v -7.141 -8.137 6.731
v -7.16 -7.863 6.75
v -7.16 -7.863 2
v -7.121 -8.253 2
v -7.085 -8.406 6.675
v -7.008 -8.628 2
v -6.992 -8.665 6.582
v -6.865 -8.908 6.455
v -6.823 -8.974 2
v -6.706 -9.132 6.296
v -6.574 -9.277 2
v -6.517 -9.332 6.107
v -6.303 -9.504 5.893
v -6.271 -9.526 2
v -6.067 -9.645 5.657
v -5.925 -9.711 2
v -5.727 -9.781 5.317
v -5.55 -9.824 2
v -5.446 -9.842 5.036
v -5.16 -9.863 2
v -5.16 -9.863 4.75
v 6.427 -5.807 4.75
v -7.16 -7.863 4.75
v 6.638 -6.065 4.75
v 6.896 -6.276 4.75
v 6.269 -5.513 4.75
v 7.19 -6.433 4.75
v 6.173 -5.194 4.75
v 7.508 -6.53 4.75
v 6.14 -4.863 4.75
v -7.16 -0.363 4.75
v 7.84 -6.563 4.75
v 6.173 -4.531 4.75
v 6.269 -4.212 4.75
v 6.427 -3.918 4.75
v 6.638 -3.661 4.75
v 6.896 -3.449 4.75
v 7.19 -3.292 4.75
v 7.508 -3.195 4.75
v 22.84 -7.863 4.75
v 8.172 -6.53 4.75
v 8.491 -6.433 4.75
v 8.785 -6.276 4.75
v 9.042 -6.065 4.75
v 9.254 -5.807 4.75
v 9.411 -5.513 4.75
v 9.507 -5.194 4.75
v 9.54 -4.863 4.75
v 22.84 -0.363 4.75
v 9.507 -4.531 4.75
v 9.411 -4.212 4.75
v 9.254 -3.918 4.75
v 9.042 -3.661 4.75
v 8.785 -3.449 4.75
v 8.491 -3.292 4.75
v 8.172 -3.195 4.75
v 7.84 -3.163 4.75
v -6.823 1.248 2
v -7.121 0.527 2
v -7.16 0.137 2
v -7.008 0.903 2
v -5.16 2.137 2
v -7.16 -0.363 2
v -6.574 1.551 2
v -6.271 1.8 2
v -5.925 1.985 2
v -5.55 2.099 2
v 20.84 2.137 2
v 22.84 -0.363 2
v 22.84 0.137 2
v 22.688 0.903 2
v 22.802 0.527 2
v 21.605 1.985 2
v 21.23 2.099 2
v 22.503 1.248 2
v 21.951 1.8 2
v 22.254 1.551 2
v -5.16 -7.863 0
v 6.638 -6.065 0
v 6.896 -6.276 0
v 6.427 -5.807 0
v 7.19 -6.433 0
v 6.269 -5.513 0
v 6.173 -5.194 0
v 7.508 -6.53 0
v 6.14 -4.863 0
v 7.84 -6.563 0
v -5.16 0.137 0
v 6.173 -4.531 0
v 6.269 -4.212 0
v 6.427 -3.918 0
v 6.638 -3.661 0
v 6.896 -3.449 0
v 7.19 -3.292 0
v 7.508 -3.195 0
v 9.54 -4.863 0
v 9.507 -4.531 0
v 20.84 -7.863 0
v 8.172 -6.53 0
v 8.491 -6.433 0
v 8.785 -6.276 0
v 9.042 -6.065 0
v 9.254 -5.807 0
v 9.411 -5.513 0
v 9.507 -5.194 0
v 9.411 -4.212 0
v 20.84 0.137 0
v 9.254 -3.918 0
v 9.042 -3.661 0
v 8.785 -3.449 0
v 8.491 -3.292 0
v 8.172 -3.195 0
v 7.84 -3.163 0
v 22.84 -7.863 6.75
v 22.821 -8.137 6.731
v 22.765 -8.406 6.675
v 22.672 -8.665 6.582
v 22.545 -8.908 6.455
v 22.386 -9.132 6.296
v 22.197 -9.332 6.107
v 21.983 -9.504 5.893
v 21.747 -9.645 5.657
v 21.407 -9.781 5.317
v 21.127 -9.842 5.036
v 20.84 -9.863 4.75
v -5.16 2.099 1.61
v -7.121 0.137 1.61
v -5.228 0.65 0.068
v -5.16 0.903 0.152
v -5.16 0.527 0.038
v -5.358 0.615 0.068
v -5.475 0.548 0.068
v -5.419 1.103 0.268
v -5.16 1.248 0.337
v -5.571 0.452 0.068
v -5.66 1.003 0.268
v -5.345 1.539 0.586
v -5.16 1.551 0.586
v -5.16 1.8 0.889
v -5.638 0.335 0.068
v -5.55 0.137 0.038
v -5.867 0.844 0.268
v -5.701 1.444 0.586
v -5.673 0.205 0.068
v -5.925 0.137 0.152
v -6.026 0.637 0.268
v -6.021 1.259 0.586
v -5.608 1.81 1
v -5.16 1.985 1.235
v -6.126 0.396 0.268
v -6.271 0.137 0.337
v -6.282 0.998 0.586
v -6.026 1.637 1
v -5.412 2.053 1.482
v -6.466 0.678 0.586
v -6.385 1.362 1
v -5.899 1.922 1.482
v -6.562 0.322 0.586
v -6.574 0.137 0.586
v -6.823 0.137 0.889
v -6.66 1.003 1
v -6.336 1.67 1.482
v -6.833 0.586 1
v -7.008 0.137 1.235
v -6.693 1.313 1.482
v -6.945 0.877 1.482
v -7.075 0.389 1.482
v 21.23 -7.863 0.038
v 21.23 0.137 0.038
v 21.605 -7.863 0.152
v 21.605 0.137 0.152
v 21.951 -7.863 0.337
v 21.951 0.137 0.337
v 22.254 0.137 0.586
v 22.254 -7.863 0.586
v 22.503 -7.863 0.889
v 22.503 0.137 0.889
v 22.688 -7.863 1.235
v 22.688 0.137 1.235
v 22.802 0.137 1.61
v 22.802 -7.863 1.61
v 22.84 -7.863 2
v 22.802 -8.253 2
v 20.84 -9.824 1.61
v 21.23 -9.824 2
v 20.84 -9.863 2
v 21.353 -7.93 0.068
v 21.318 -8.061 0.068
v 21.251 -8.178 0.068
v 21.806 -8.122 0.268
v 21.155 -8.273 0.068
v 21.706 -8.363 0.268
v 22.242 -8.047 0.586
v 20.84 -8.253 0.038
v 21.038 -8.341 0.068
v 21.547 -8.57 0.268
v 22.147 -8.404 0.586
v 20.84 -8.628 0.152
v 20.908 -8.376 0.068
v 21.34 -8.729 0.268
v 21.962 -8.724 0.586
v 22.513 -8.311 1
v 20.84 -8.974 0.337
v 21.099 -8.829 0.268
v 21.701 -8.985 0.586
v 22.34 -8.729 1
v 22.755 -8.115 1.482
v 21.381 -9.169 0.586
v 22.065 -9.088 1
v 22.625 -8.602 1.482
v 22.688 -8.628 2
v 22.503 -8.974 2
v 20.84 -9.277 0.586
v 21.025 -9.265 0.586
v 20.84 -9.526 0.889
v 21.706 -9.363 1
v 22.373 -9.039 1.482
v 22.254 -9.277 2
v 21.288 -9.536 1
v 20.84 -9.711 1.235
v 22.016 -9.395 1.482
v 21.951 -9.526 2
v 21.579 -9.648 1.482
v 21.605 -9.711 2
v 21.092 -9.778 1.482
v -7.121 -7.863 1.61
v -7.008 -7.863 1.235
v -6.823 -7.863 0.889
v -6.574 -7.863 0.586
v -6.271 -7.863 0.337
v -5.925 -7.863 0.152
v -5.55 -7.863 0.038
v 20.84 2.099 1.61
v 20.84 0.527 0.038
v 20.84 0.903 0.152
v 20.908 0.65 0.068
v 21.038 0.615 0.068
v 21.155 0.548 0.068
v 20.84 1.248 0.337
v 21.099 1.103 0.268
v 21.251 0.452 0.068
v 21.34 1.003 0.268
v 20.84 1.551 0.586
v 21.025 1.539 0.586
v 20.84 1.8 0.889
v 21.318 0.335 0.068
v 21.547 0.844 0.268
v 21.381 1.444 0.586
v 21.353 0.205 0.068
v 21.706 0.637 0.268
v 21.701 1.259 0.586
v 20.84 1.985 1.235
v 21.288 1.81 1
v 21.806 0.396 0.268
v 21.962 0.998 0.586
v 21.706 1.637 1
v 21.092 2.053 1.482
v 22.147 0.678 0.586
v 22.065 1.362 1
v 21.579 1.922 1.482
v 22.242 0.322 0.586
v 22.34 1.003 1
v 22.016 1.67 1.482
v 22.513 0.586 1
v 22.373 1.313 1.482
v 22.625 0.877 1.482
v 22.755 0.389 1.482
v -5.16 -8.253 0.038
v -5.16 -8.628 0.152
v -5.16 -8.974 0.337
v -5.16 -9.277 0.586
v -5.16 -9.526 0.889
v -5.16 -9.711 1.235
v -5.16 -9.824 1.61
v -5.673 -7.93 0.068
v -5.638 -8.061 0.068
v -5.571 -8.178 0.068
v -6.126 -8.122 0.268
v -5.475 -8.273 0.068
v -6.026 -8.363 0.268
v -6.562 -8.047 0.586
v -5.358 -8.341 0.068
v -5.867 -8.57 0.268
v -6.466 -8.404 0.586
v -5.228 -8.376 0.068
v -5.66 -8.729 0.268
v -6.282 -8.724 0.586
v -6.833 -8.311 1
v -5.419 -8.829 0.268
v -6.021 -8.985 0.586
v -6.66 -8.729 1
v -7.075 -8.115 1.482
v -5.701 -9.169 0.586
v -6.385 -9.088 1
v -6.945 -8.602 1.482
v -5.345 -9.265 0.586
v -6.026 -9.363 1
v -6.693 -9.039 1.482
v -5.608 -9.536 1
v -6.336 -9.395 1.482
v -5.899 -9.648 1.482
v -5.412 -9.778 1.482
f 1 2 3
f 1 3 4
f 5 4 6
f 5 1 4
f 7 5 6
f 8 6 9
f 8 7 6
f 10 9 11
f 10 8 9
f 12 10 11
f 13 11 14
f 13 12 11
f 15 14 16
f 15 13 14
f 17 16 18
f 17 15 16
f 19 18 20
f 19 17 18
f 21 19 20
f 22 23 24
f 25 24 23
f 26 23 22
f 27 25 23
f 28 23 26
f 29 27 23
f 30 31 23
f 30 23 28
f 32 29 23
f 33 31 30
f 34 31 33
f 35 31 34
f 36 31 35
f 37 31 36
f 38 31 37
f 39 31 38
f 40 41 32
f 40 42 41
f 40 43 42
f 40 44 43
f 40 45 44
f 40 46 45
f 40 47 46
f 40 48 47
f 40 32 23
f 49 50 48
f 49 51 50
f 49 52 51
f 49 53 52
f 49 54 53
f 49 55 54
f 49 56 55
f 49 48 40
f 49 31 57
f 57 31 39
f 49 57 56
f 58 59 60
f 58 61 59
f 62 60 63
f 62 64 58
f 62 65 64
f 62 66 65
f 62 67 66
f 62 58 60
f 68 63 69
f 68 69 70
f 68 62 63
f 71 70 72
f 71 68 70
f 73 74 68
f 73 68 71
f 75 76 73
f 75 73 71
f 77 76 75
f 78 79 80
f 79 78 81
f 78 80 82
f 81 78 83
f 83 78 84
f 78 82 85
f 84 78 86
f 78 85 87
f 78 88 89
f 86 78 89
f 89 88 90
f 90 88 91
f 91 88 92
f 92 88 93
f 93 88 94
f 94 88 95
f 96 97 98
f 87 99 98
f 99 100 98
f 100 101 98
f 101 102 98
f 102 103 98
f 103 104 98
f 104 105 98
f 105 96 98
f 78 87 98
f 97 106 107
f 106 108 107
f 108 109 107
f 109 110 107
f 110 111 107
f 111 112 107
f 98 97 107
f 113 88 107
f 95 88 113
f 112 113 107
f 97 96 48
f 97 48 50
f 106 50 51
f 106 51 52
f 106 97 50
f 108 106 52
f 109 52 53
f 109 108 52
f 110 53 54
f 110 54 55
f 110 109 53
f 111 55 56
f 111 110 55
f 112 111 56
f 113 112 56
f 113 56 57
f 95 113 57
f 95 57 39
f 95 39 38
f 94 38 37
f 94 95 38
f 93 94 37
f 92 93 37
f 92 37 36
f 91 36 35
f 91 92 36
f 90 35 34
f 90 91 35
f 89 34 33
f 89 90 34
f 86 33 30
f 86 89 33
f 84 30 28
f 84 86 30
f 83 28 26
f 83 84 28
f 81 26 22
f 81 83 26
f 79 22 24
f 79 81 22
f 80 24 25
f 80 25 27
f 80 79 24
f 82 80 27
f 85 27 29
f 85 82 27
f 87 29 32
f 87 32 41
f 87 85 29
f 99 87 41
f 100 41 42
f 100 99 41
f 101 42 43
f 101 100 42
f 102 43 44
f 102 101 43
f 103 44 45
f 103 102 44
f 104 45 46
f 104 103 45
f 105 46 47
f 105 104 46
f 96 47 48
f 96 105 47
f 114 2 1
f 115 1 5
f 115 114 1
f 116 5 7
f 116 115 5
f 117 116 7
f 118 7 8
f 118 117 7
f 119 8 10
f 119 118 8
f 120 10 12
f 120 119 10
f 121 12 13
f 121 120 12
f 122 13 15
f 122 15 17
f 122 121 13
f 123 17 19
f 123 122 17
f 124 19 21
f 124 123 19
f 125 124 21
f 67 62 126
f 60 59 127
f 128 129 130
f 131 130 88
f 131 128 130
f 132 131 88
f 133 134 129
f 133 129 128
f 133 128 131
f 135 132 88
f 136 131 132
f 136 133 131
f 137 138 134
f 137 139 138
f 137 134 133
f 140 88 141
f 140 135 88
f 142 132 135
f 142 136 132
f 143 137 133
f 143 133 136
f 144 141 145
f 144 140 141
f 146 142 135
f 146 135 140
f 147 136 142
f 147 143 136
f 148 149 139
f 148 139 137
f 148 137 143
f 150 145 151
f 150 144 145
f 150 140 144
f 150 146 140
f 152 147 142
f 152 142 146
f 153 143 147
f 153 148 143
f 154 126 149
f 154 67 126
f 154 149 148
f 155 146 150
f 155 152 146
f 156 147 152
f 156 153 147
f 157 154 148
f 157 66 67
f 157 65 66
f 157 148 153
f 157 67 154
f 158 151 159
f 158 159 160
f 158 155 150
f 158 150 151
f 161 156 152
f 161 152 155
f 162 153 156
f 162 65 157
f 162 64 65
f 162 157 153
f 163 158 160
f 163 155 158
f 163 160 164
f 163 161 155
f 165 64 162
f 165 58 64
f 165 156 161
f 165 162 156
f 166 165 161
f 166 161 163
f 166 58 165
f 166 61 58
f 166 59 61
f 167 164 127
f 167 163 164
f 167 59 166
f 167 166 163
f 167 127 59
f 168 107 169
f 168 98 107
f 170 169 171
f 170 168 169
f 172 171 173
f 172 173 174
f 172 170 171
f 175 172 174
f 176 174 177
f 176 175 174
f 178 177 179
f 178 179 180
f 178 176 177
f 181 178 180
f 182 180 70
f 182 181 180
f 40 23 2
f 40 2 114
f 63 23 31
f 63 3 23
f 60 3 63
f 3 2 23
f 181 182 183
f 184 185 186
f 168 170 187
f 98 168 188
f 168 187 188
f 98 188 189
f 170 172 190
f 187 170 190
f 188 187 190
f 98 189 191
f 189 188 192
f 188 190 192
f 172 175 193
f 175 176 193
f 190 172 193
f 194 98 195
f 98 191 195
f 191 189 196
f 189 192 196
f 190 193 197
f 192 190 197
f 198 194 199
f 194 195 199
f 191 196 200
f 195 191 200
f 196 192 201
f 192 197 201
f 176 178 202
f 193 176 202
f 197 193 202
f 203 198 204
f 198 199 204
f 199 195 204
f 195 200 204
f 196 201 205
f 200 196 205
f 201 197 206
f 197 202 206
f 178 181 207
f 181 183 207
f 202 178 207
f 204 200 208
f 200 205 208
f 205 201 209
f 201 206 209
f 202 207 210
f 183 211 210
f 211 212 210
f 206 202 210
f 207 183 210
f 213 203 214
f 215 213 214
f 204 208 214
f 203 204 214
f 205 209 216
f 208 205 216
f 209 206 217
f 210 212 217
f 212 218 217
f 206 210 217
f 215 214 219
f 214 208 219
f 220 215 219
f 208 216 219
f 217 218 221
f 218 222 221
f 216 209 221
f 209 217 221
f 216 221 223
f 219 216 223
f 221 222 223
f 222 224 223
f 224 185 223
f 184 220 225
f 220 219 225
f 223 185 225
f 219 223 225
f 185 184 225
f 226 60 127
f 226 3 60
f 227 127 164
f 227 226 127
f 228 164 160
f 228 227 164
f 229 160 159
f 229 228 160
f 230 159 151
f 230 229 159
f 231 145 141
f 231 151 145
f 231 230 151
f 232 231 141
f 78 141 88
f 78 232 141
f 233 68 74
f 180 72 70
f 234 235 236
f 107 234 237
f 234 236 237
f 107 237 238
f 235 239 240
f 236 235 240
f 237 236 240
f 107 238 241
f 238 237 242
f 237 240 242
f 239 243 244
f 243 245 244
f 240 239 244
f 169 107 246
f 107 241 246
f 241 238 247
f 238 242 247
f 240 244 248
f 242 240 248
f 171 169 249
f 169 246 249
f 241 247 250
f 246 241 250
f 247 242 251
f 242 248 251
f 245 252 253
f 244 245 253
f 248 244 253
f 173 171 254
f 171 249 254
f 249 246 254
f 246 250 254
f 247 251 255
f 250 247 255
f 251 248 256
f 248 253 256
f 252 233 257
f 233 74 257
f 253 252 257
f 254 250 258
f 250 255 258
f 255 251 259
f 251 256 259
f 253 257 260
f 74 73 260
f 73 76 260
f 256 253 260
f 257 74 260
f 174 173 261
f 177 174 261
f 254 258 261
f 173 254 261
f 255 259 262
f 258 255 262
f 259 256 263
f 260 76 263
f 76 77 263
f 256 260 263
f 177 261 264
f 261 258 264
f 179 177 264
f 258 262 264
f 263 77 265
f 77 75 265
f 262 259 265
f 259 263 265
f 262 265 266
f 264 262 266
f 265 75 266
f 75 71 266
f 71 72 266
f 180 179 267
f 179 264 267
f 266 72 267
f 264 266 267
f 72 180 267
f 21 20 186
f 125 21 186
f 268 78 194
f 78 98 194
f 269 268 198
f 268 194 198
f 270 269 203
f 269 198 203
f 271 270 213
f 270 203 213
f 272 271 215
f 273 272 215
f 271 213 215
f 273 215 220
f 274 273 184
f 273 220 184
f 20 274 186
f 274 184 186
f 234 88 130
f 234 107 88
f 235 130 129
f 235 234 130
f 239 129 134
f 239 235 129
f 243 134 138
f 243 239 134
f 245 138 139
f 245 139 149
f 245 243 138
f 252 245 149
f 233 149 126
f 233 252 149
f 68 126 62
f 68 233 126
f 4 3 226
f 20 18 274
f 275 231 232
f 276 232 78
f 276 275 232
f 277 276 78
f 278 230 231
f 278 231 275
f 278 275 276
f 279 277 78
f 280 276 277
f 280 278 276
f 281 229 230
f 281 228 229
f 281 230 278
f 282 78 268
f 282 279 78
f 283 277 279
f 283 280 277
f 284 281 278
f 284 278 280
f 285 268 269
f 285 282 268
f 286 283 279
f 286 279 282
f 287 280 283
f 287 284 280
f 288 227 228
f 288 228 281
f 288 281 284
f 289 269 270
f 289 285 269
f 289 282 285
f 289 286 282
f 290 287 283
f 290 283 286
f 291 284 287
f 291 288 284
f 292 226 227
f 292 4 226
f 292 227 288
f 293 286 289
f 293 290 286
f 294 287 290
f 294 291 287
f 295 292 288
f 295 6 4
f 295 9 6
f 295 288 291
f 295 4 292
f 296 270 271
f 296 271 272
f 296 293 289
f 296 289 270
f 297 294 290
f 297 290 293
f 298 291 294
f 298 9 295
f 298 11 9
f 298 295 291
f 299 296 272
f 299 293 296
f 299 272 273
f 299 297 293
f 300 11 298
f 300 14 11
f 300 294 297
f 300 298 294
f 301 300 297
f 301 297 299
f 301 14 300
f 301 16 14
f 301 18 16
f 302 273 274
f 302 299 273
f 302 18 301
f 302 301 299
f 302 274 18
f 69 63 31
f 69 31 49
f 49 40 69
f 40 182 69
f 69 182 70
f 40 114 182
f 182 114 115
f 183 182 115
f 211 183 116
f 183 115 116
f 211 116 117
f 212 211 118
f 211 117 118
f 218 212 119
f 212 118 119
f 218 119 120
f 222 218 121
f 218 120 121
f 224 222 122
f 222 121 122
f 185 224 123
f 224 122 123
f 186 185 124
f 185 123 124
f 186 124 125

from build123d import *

# Parameters (mm, degrees)
F0_W     = 30
F0_H     = 2.5
F1_DEPTH = 2
F0_H_2   = 7.5
F0_R     = 1.7
F2_DEPTH = 4.75
F0_H_3   = 2
F3_DEPTH = 6.75
F4_R     = 1.99999


# Not quite as in the source:
# - a fillet or chamfer is up to 0.001 mm smaller than in the source, because OpenCascade refuses the exact size


with BuildPart() as f1:
    # F0 (on Top) → F1 (new body)
    with BuildSketch(Plane.XY):
        with Locations((7.8400733322, 0.8872417808)):
            Rectangle(F0_W, F0_H)
    extrude(amount=F1_DEPTH)

    # F0 (on Top) → F2 (join)
    with BuildSketch(Plane.XY):
        with Locations((7.8400733322, -4.1127582192)):
            Rectangle(F0_W, F0_H_2)
        with Locations((7.8400733322, -4.8627582192)):
            Circle(F0_R, mode=Mode.SUBTRACT)
    extrude(amount=F2_DEPTH)

    # F0 (on Top) → F3 (join)
    with BuildSketch(Plane.XY):
        with Locations((7.8400733322, -8.8627582192)):
            Rectangle(F0_W, F0_H_3)
    extrude(amount=F3_DEPTH)

    # F4 (radius 2 in the source; OpenCascade refuses exactly that, so slightly less here)
    f4_edges = [f1.edges().sort_by_distance(p)[0] for p in [
        (-7.159927, 2.137242, 1),
        (22.840073, 2.137242, 1),
        (-7.159927, -9.862758, 3.375),
        (22.840073, -9.862758, 3.375),
        (7.840073, 2.137242, 0),
        (22.840073, -3.862758, 0),
        (-7.159927, -3.862758, 0),
        (7.840073, -9.862758, 0),
        (7.840073, -9.862758, 6.75),
    ]]
    fillet(f4_edges, radius=F4_R)


solid = f1.part
